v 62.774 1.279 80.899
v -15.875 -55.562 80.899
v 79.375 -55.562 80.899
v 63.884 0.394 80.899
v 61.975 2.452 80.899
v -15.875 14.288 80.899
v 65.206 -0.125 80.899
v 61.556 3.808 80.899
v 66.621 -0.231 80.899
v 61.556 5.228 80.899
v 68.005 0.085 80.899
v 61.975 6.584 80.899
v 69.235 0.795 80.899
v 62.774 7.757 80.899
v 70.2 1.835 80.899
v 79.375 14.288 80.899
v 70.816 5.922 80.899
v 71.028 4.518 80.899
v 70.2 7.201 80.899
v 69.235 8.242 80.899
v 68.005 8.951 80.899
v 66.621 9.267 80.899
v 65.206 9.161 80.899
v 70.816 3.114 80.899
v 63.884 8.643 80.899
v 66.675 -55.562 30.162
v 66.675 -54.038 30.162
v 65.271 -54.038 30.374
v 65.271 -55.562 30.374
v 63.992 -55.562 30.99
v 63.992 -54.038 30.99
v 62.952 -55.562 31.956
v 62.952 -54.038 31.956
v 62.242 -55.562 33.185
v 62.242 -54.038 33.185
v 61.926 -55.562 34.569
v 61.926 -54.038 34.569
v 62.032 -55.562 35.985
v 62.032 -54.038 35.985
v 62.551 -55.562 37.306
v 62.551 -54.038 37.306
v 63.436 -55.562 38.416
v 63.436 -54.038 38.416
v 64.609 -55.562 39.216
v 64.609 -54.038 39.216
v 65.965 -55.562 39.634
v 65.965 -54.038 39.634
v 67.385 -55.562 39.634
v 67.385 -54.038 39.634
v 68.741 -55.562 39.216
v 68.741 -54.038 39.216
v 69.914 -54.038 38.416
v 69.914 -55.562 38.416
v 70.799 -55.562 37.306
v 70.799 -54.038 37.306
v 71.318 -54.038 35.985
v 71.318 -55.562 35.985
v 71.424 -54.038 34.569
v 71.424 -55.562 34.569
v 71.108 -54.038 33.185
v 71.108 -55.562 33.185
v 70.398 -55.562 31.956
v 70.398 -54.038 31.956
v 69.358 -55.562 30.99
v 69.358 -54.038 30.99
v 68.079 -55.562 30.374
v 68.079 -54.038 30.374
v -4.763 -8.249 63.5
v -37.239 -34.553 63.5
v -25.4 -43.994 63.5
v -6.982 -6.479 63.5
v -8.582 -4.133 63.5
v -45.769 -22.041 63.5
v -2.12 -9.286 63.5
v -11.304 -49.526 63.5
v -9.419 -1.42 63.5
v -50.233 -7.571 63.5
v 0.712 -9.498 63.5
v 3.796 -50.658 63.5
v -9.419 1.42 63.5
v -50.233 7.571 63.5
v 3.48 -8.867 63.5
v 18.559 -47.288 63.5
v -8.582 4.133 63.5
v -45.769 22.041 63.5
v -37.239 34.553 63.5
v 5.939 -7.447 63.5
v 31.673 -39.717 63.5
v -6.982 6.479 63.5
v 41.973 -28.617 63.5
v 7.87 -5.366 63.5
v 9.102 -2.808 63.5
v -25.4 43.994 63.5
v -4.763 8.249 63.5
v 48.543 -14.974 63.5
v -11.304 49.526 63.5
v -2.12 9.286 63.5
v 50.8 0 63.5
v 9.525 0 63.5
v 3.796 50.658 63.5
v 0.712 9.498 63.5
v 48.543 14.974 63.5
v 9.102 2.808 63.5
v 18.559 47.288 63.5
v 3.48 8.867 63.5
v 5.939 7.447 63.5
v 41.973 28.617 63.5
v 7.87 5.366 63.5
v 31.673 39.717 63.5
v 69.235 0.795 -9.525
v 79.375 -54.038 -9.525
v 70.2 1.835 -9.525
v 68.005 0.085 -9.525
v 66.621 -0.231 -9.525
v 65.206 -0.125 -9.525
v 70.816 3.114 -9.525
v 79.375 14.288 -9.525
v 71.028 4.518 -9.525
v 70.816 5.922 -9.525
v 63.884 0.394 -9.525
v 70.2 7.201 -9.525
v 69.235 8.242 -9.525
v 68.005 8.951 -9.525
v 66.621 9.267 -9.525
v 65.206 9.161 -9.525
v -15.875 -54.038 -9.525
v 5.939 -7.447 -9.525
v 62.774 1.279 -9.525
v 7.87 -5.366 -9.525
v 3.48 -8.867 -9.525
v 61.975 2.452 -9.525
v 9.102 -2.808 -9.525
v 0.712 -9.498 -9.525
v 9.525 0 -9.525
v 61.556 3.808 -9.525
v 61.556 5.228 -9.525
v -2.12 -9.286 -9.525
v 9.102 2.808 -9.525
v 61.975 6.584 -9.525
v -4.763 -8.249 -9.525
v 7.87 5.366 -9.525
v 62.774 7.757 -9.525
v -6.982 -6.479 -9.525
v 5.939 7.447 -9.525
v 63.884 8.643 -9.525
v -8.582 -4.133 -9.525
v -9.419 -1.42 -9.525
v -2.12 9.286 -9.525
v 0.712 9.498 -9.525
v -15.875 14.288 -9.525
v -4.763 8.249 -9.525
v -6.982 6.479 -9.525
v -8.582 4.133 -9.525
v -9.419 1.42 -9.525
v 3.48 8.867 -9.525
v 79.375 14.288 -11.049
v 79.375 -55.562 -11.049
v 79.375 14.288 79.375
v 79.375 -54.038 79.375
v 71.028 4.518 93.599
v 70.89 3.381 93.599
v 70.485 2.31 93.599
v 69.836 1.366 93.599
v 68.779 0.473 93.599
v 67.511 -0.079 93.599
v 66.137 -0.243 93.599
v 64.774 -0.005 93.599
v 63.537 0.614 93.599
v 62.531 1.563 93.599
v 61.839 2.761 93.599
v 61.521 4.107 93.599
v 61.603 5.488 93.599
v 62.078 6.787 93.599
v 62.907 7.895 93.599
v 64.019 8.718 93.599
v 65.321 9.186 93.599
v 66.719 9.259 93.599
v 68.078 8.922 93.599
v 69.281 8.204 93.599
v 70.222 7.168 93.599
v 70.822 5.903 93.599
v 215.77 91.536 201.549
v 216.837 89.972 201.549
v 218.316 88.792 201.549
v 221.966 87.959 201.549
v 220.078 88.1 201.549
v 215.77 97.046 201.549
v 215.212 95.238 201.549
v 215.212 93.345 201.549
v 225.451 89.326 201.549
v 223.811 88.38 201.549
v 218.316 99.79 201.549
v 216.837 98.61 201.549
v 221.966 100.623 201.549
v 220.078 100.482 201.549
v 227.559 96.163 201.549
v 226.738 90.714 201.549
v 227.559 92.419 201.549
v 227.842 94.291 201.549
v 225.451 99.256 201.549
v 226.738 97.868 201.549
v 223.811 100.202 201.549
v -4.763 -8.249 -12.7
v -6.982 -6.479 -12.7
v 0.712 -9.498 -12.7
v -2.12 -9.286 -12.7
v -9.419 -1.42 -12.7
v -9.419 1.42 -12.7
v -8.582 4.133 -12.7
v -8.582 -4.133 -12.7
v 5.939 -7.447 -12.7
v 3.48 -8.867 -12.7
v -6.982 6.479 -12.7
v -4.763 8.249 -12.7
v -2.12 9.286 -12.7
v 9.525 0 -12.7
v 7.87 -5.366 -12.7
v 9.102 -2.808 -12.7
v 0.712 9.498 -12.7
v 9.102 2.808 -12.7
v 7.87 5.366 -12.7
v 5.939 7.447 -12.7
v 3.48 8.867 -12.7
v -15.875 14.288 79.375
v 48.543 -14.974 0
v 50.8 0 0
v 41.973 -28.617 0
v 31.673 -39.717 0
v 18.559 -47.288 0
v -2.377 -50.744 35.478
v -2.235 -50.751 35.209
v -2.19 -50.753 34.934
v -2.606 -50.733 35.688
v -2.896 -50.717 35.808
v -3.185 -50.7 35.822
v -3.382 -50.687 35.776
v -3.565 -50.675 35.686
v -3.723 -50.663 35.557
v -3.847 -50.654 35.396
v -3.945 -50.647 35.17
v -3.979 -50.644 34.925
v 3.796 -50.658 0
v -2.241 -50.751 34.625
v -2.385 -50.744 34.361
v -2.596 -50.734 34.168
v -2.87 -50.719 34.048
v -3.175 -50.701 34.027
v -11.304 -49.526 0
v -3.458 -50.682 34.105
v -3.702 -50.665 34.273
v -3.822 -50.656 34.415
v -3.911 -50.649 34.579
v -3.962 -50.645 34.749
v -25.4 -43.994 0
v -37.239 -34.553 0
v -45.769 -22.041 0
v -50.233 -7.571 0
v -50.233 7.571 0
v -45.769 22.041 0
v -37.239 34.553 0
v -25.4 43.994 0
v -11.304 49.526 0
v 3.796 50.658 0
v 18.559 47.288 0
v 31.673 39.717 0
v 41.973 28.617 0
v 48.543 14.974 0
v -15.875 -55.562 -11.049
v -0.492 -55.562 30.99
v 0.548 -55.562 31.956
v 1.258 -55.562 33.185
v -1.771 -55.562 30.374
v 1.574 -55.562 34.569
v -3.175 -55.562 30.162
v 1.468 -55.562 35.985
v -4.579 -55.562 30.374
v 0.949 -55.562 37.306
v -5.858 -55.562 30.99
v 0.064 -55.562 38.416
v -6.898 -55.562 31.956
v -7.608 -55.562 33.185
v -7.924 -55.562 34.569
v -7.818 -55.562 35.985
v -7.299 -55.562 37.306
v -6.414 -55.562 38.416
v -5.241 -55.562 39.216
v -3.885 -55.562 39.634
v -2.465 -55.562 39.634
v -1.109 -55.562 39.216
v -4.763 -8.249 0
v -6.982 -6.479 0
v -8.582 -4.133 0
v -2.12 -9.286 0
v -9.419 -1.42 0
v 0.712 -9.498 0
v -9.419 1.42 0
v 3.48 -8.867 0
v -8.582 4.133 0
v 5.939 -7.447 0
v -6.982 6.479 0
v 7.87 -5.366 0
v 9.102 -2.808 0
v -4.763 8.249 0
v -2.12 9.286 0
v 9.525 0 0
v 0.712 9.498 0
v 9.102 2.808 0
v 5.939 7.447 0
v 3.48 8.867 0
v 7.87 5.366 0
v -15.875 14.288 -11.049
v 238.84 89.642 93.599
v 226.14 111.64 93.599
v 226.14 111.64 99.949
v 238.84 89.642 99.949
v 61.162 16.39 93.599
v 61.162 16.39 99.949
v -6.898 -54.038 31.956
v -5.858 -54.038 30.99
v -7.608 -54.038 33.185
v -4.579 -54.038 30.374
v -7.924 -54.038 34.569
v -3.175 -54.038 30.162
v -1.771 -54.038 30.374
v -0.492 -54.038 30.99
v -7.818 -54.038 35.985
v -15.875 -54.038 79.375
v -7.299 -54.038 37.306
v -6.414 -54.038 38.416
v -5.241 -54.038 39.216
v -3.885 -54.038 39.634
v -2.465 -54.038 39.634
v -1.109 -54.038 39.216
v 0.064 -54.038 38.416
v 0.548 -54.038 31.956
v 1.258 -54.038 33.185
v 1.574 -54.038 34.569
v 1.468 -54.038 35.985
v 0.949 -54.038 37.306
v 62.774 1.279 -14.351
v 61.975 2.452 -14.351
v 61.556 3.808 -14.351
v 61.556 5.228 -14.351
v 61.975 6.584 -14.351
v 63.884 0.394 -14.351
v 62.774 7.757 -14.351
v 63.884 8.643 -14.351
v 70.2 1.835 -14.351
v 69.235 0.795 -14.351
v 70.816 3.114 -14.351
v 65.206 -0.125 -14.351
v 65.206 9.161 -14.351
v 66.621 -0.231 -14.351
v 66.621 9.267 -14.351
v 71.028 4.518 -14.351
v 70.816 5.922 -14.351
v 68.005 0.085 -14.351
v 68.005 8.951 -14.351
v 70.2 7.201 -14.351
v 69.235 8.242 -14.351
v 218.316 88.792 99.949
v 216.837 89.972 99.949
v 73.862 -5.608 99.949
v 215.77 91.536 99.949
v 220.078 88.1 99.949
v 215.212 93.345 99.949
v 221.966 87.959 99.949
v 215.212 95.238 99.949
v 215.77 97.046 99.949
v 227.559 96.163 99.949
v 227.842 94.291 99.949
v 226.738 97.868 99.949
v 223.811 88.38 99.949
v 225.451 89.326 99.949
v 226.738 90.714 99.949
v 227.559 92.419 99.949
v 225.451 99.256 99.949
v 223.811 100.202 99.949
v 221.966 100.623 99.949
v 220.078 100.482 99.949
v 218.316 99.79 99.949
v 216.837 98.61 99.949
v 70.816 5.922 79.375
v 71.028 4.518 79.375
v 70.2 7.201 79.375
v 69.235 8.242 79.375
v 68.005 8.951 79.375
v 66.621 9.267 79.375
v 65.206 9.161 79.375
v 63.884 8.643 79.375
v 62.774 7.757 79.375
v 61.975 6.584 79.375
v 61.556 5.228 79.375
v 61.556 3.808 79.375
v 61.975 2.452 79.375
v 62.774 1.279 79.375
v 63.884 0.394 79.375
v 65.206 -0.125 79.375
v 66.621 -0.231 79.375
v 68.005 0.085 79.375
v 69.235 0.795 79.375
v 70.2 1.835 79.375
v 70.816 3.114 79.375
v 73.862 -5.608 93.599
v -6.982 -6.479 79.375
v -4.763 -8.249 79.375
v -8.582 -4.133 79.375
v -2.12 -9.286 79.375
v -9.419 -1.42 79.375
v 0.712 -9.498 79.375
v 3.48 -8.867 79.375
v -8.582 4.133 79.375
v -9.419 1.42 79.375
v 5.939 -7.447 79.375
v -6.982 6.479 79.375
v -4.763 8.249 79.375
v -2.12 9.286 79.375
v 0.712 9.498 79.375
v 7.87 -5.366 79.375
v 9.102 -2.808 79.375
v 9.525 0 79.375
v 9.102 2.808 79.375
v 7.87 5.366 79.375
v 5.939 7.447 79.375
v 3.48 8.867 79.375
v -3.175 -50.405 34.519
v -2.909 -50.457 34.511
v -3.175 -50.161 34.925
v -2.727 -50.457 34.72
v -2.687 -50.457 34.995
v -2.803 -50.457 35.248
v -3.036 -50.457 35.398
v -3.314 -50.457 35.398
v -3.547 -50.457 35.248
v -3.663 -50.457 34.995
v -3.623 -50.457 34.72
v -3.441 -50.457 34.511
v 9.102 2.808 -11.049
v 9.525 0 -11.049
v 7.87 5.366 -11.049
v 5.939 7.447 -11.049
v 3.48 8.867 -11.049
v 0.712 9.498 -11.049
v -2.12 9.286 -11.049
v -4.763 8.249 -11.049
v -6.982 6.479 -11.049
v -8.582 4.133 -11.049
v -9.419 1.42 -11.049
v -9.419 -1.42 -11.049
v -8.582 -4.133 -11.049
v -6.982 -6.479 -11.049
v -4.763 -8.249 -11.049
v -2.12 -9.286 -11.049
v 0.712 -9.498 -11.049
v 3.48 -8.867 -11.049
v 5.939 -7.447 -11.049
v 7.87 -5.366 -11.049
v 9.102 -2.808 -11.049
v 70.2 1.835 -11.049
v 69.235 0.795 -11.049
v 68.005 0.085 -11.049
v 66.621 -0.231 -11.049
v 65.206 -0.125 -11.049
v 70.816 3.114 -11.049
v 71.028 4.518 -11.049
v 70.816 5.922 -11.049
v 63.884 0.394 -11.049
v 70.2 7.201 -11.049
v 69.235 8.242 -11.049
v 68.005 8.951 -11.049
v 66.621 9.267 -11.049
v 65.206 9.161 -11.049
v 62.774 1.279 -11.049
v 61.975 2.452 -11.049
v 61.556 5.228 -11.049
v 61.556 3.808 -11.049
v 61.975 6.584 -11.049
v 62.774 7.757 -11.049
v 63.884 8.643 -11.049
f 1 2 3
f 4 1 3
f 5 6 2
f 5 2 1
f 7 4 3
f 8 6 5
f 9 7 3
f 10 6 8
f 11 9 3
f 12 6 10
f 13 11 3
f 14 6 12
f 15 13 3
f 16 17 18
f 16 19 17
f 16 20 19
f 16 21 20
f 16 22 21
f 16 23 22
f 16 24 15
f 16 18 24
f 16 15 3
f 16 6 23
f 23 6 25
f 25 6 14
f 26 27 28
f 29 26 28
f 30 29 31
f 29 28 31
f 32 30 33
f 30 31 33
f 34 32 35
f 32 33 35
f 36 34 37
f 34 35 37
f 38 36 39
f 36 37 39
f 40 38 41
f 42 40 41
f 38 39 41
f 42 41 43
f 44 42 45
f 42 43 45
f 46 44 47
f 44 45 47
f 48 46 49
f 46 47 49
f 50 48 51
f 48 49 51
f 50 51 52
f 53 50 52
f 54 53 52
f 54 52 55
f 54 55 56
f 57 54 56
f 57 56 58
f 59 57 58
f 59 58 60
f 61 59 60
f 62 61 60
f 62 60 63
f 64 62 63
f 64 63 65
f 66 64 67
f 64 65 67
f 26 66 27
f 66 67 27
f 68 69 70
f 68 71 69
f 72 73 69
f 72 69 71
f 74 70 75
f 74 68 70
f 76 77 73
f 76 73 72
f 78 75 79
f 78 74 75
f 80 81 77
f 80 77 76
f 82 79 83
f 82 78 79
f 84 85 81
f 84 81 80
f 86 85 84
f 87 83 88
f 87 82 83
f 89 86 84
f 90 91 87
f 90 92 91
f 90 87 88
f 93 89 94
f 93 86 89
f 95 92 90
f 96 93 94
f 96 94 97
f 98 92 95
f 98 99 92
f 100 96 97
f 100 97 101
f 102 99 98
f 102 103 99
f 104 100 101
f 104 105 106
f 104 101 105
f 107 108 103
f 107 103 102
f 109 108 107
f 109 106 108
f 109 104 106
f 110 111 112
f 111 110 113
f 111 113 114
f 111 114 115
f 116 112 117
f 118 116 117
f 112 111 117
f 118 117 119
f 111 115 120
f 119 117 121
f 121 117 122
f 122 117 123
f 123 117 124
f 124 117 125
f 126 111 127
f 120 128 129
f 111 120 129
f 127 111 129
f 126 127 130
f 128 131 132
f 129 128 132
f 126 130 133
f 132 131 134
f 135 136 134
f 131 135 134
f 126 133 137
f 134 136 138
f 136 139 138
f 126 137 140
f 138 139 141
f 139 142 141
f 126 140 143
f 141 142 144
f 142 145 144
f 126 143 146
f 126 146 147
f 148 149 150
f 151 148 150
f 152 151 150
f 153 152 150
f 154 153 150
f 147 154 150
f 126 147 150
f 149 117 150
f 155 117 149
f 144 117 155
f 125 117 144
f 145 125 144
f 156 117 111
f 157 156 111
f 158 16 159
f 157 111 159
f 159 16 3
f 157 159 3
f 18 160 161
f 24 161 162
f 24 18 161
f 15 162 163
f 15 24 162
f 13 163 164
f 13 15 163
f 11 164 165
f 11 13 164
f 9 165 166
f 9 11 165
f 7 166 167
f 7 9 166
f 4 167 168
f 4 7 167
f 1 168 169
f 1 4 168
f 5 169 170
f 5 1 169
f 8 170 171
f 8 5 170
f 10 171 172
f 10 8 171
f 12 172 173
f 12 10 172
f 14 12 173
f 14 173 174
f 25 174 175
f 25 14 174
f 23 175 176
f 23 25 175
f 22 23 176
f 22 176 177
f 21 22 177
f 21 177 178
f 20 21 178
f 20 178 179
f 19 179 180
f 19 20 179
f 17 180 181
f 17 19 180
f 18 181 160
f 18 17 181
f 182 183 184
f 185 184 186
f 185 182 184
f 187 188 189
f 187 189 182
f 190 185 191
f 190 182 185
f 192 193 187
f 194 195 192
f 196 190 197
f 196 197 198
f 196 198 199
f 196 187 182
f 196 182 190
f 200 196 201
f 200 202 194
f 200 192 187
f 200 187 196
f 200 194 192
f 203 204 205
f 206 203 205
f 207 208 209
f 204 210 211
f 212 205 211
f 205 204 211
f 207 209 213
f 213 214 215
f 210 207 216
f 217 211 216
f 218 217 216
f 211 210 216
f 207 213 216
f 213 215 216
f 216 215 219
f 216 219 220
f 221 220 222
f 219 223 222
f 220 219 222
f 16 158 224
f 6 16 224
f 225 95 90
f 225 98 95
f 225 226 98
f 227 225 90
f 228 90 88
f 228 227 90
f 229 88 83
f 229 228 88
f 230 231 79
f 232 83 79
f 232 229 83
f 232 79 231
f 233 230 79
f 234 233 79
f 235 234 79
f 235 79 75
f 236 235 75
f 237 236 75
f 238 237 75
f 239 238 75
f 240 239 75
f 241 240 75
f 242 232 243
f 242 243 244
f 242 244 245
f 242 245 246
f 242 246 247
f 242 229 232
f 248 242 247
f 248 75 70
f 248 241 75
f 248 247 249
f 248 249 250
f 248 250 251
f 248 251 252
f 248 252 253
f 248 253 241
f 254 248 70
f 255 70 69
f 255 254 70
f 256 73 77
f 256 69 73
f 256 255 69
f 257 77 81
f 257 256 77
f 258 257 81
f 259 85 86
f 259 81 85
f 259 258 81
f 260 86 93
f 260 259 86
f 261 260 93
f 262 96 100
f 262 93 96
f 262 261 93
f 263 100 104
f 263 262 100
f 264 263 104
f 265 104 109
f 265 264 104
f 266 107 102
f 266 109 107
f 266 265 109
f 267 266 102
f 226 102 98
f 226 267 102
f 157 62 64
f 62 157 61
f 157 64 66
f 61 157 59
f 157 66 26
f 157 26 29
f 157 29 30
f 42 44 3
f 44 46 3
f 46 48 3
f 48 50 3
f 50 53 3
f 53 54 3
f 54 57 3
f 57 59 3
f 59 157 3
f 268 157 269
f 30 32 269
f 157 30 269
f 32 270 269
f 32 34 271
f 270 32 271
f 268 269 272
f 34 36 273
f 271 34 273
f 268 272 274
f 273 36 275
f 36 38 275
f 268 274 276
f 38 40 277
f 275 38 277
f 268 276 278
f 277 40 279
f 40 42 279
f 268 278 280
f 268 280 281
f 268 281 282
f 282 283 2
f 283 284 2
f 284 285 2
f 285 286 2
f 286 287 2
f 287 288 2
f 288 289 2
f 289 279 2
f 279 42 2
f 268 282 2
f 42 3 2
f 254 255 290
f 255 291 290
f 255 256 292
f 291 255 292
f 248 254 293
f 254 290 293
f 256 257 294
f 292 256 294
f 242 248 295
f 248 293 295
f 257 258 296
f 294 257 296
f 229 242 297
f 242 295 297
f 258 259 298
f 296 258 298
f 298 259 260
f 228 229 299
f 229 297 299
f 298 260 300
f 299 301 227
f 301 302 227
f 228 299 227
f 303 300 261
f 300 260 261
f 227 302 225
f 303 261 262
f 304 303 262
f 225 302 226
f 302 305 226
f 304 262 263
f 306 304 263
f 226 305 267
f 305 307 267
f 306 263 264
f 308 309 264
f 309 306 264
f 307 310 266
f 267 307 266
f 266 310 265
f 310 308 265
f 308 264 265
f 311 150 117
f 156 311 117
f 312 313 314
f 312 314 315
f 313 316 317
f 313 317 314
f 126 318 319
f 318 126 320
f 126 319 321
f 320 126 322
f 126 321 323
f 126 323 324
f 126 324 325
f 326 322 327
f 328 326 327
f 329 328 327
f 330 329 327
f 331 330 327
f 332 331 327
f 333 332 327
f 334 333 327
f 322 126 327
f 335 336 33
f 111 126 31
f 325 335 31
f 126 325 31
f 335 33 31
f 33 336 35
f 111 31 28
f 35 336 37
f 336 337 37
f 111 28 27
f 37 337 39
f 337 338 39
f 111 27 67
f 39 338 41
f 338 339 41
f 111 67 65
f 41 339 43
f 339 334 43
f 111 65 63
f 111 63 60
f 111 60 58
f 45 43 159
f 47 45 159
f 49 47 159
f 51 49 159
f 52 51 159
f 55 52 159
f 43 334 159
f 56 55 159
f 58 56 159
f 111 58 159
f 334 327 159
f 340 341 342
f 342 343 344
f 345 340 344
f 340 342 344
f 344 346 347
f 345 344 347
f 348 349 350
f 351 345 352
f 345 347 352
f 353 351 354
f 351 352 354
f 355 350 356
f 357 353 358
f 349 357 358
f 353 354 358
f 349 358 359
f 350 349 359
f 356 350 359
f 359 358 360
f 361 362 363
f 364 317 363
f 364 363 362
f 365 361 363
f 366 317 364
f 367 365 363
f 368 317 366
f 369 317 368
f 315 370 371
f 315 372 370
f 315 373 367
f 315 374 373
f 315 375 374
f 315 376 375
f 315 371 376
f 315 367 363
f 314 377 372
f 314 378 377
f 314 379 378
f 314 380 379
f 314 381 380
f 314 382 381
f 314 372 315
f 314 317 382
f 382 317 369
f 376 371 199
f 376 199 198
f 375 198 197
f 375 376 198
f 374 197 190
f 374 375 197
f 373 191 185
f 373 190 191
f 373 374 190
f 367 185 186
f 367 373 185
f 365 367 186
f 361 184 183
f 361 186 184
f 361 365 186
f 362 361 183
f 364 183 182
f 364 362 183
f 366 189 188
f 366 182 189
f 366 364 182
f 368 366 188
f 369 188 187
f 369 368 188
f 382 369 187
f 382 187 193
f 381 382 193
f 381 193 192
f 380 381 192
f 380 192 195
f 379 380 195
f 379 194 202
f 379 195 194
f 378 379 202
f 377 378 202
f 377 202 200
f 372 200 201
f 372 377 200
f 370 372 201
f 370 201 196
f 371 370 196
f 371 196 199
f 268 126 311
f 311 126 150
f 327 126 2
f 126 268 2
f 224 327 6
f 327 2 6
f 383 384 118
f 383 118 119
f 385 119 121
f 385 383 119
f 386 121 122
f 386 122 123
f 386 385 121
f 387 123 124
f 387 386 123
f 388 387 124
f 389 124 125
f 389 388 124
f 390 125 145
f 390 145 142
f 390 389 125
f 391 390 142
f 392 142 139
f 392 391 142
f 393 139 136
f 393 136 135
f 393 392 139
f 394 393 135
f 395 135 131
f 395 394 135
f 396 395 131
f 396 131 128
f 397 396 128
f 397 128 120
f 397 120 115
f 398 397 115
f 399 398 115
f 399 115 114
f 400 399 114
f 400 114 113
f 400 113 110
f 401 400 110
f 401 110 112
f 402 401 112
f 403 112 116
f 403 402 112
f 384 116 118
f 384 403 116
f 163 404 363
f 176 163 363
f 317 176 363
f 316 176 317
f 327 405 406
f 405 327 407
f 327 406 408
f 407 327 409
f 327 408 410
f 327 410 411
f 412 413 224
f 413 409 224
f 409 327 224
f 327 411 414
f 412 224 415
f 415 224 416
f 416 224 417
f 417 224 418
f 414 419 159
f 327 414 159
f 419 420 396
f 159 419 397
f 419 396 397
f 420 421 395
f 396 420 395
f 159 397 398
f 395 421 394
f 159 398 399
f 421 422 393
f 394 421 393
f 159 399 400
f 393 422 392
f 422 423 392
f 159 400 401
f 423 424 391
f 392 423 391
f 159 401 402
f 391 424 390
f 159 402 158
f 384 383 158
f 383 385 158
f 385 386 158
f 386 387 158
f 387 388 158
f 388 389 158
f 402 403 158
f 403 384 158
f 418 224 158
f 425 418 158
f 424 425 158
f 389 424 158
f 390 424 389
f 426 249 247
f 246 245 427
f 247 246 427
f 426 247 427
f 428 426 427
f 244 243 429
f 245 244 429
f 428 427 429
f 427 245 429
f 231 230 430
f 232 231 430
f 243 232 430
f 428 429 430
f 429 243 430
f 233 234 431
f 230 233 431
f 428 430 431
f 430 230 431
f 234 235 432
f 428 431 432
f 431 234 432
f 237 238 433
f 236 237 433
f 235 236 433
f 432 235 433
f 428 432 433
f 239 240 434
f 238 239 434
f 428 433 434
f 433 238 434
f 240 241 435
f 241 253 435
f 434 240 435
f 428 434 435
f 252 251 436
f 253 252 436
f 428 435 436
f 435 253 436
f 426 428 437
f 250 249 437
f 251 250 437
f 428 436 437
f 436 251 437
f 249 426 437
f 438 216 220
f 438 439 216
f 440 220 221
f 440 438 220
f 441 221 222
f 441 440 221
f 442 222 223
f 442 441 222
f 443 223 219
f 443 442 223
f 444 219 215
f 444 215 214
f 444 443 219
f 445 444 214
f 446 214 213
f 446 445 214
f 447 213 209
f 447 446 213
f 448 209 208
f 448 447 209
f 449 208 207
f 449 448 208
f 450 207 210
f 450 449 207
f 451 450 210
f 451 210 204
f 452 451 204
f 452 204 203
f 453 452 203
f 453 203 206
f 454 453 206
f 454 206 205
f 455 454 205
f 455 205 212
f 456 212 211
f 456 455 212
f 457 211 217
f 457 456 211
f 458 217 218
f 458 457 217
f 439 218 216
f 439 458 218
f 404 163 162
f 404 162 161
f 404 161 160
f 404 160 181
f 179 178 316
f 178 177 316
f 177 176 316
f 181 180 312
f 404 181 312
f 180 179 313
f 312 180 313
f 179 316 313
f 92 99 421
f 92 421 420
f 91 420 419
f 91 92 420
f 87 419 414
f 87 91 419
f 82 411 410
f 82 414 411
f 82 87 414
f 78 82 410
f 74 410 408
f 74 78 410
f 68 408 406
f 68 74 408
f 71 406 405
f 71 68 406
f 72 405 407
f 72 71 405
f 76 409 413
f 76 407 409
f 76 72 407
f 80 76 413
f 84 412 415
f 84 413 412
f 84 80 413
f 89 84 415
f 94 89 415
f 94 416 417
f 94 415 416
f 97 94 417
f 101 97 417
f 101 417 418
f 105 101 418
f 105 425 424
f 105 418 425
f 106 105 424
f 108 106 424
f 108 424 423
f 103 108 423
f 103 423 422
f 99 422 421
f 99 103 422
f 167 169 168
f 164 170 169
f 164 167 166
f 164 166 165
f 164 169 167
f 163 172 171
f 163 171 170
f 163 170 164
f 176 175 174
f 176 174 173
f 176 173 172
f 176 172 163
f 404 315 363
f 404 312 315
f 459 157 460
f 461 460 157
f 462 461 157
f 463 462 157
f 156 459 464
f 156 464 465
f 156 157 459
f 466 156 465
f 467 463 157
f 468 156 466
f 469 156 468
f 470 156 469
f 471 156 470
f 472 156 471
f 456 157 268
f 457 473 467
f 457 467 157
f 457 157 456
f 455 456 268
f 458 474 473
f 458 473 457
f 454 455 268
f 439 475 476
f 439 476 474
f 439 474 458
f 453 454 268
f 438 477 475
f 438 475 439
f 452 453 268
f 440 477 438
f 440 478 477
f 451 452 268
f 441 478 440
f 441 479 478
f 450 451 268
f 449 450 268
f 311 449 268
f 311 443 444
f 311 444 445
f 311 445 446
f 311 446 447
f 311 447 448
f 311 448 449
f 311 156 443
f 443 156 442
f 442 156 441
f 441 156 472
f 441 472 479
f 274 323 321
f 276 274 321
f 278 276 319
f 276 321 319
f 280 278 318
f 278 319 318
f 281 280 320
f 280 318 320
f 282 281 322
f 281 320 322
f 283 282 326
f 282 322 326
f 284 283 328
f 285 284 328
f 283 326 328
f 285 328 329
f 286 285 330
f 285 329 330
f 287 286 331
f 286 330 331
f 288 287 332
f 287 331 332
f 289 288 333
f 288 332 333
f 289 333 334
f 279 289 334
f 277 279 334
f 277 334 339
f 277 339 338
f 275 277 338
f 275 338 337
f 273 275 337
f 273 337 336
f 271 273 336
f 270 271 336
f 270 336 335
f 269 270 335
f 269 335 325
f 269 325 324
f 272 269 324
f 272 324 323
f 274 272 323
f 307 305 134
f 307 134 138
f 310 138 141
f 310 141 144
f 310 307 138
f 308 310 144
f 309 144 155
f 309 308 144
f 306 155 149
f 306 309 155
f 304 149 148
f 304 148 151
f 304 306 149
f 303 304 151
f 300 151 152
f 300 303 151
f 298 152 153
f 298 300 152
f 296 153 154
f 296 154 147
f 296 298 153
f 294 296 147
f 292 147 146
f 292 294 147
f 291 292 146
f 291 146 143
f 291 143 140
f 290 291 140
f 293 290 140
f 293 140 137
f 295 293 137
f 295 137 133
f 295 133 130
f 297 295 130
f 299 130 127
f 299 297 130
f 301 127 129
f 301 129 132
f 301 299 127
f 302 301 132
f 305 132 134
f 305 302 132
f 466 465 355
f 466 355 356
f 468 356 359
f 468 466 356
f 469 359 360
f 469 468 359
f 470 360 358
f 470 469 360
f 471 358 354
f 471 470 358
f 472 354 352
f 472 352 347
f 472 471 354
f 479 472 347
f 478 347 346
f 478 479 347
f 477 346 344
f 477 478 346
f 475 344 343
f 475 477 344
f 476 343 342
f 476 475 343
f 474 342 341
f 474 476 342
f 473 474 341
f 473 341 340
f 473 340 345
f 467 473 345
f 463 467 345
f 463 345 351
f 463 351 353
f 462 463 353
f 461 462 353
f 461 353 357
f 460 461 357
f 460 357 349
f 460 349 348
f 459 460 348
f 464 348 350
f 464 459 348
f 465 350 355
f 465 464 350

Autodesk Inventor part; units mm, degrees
ref_plane "YZ Plane" through (0, 0, 0) normal (1, 0, 0) x (0, 1, 0)
ref_plane "XZ Plane" through (0, 0, 0) normal (0, 1, 0) x (-1, 0, 0)
ref_plane "XY Plane" through (0, 0, 0) normal (0, 0, 1) x (1, 0, 0)
sketch "Sketch1" plane through (0, 0, 0) normal (0, 0, 1) x (1, 0, 0)
  circle A0 centre (0, 0) radius 50.8
  dimension "d0" = 101.6
extrude "Extrusion1" add sketch "Sketch1" along normal blind 63.5
sketch "Sketch2" plane through (0, 0, 63.5) normal (0, 0, 1) x (1, 0, 0)
  circle A0 centre (0, 0) radius 50.8 projected
  circle A1 centre (0, 0) radius 9.525
  dimension "d5" = 19.05
extrude "Extrusion2" add sketch "Sketch2" along normal blind 15.875 and the other way blind 76.2 contours A1
sketch "Sketch3" plane through (0, 0, 79.375) normal (0, 0, 1) x (1, 0, 0)
  line L0 (-15.875, -55.5625) -> (79.375, -55.5625)
  line L1 (79.375, -55.5625) -> (79.375, 14.2875)
  line L2 (79.375, 14.2875) -> (-15.875, 14.2875)
  line L3 (-15.875, 14.2875) -> (-15.875, -55.5625)
  dimension "d11" = 95.25
  dimension "d13" = 69.85
extrude "Extrusion3" add sketch "Sketch3" along normal blind 1.524
sketch "Sketch4" plane through (0, 0, 79.375) normal (0, 0, -1) x (-1, 0, 0)
  line L0 (15.875, -55.5625) -> (-79.375, -55.5625) projected
  line L1 (15.875, 14.2875) -> (15.875, -55.5625) projected
  line L2 (-79.375, -55.5625) -> (15.875, -55.5625)
  line L3 (15.875, -55.5625) -> (15.875, -54.0385)
  line L4 (15.875, -54.0385) -> (-79.375, -54.0385)
  line L5 (-79.375, -54.0385) -> (-79.375, -55.5625)
  point P0 (-79.375, 14.2875)
  dimension "d16" = 1.524
  dimension "d47" = 69.85
  dimension "d48" = 95.25
extrude "Extrusion4" add sketch "Sketch4" along normal blind 88.9
sketch "Sketch5" plane through (0, 0, -9.525) normal (0, 0, -1) x (-1, 0, 0)
  line L0 (-79.375, -55.5625) -> (15.875, -55.5625)
  line L1 (15.875, -55.5625) -> (15.875, 14.2875)
  line L2 (15.875, 14.2875) -> (-79.375, 14.2875)
  line L3 (-79.375, 14.2875) -> (-79.375, -55.5625)
  point P0 (0, 0)
extrude "Extrusion5" add sketch "Sketch5" along normal blind 1.524
sketch "Sketch6" plane through (0, 0, 80.899) normal (0, 0, 1) x (1, 0, 0)
  circle A0 centre (66.2655, 4.5181) radius 4.7625
  point P0 (0, 0)
  dimension "d21" = 9.525
extrude "Extrusion6" add sketch "Sketch6" along normal blind 12.7 and the other way blind 95.25
sketch "Sketch7" plane through (66.2655, 4.5181, 93.599) normal (0, 0, 1) x (1, 0, 0)
  line L0 (-5.1033, 11.8715) -> (159.8746, 107.1215)
  line L1 (159.8746, 107.1215) -> (172.5746, 85.1244)
  line L2 (172.5746, 85.1244) -> (7.5967, -10.1256)
  line L3 (7.5967, -10.1256) -> (-5.1033, 11.8715)
  line L4 (0, 0) -> (168.275, 0) construction
  point P0 (-66.2655, -4.5181)
  dimension "d29" = 25.4
  dimension "d30" = 190.5
  dimension "d40" = 30
extrude "Extrusion7" add sketch "Sketch7" along normal blind 6.35
sketch "Sketch8" plane through (66.2655, 4.5181, 99.949) normal (0, 0, 1) x (1, 0, 0)
  line L0 (172.5746, 85.1244) -> (159.8746, 107.1215) projected
  circle A0 centre (155.226, 89.773) radius 6.35
  point P0 (-66.2655, -4.5181)
  dimension "d43" = 12.7
  dimension "d44" = 12.7
extrude "Extrusion8" add sketch "Sketch8" along normal blind 101.6
sketch "Sketch9" plane through (-15.875, -55.5625, 80.899) normal (0, -1, 0) x (1, 0, 0)
  line L0 (0, 0) -> (0, -91.948) projected
  line L1 (95.25, -91.948) -> (0, -91.948) projected
  circle A0 centre (12.7, -45.974) radius 4.7625
  circle A1 centre (82.55, -45.974) radius 4.7625
  point P0 (15.875, -80.899)
  dimension "d49" = 91.948
  dimension "d50" = 95.25
  dimension "d51" = 9.525
  dimension "d52" = 12.7
  dimension "d55" = 69.85
hole "Hole1" at (66.675, -55.5625, 34.925) at (-3.175, -55.5625, 34.925) direction (0, 1, 0) diameter 9.525 depth 2.54 tip angle 118
properties part number "0winch"
